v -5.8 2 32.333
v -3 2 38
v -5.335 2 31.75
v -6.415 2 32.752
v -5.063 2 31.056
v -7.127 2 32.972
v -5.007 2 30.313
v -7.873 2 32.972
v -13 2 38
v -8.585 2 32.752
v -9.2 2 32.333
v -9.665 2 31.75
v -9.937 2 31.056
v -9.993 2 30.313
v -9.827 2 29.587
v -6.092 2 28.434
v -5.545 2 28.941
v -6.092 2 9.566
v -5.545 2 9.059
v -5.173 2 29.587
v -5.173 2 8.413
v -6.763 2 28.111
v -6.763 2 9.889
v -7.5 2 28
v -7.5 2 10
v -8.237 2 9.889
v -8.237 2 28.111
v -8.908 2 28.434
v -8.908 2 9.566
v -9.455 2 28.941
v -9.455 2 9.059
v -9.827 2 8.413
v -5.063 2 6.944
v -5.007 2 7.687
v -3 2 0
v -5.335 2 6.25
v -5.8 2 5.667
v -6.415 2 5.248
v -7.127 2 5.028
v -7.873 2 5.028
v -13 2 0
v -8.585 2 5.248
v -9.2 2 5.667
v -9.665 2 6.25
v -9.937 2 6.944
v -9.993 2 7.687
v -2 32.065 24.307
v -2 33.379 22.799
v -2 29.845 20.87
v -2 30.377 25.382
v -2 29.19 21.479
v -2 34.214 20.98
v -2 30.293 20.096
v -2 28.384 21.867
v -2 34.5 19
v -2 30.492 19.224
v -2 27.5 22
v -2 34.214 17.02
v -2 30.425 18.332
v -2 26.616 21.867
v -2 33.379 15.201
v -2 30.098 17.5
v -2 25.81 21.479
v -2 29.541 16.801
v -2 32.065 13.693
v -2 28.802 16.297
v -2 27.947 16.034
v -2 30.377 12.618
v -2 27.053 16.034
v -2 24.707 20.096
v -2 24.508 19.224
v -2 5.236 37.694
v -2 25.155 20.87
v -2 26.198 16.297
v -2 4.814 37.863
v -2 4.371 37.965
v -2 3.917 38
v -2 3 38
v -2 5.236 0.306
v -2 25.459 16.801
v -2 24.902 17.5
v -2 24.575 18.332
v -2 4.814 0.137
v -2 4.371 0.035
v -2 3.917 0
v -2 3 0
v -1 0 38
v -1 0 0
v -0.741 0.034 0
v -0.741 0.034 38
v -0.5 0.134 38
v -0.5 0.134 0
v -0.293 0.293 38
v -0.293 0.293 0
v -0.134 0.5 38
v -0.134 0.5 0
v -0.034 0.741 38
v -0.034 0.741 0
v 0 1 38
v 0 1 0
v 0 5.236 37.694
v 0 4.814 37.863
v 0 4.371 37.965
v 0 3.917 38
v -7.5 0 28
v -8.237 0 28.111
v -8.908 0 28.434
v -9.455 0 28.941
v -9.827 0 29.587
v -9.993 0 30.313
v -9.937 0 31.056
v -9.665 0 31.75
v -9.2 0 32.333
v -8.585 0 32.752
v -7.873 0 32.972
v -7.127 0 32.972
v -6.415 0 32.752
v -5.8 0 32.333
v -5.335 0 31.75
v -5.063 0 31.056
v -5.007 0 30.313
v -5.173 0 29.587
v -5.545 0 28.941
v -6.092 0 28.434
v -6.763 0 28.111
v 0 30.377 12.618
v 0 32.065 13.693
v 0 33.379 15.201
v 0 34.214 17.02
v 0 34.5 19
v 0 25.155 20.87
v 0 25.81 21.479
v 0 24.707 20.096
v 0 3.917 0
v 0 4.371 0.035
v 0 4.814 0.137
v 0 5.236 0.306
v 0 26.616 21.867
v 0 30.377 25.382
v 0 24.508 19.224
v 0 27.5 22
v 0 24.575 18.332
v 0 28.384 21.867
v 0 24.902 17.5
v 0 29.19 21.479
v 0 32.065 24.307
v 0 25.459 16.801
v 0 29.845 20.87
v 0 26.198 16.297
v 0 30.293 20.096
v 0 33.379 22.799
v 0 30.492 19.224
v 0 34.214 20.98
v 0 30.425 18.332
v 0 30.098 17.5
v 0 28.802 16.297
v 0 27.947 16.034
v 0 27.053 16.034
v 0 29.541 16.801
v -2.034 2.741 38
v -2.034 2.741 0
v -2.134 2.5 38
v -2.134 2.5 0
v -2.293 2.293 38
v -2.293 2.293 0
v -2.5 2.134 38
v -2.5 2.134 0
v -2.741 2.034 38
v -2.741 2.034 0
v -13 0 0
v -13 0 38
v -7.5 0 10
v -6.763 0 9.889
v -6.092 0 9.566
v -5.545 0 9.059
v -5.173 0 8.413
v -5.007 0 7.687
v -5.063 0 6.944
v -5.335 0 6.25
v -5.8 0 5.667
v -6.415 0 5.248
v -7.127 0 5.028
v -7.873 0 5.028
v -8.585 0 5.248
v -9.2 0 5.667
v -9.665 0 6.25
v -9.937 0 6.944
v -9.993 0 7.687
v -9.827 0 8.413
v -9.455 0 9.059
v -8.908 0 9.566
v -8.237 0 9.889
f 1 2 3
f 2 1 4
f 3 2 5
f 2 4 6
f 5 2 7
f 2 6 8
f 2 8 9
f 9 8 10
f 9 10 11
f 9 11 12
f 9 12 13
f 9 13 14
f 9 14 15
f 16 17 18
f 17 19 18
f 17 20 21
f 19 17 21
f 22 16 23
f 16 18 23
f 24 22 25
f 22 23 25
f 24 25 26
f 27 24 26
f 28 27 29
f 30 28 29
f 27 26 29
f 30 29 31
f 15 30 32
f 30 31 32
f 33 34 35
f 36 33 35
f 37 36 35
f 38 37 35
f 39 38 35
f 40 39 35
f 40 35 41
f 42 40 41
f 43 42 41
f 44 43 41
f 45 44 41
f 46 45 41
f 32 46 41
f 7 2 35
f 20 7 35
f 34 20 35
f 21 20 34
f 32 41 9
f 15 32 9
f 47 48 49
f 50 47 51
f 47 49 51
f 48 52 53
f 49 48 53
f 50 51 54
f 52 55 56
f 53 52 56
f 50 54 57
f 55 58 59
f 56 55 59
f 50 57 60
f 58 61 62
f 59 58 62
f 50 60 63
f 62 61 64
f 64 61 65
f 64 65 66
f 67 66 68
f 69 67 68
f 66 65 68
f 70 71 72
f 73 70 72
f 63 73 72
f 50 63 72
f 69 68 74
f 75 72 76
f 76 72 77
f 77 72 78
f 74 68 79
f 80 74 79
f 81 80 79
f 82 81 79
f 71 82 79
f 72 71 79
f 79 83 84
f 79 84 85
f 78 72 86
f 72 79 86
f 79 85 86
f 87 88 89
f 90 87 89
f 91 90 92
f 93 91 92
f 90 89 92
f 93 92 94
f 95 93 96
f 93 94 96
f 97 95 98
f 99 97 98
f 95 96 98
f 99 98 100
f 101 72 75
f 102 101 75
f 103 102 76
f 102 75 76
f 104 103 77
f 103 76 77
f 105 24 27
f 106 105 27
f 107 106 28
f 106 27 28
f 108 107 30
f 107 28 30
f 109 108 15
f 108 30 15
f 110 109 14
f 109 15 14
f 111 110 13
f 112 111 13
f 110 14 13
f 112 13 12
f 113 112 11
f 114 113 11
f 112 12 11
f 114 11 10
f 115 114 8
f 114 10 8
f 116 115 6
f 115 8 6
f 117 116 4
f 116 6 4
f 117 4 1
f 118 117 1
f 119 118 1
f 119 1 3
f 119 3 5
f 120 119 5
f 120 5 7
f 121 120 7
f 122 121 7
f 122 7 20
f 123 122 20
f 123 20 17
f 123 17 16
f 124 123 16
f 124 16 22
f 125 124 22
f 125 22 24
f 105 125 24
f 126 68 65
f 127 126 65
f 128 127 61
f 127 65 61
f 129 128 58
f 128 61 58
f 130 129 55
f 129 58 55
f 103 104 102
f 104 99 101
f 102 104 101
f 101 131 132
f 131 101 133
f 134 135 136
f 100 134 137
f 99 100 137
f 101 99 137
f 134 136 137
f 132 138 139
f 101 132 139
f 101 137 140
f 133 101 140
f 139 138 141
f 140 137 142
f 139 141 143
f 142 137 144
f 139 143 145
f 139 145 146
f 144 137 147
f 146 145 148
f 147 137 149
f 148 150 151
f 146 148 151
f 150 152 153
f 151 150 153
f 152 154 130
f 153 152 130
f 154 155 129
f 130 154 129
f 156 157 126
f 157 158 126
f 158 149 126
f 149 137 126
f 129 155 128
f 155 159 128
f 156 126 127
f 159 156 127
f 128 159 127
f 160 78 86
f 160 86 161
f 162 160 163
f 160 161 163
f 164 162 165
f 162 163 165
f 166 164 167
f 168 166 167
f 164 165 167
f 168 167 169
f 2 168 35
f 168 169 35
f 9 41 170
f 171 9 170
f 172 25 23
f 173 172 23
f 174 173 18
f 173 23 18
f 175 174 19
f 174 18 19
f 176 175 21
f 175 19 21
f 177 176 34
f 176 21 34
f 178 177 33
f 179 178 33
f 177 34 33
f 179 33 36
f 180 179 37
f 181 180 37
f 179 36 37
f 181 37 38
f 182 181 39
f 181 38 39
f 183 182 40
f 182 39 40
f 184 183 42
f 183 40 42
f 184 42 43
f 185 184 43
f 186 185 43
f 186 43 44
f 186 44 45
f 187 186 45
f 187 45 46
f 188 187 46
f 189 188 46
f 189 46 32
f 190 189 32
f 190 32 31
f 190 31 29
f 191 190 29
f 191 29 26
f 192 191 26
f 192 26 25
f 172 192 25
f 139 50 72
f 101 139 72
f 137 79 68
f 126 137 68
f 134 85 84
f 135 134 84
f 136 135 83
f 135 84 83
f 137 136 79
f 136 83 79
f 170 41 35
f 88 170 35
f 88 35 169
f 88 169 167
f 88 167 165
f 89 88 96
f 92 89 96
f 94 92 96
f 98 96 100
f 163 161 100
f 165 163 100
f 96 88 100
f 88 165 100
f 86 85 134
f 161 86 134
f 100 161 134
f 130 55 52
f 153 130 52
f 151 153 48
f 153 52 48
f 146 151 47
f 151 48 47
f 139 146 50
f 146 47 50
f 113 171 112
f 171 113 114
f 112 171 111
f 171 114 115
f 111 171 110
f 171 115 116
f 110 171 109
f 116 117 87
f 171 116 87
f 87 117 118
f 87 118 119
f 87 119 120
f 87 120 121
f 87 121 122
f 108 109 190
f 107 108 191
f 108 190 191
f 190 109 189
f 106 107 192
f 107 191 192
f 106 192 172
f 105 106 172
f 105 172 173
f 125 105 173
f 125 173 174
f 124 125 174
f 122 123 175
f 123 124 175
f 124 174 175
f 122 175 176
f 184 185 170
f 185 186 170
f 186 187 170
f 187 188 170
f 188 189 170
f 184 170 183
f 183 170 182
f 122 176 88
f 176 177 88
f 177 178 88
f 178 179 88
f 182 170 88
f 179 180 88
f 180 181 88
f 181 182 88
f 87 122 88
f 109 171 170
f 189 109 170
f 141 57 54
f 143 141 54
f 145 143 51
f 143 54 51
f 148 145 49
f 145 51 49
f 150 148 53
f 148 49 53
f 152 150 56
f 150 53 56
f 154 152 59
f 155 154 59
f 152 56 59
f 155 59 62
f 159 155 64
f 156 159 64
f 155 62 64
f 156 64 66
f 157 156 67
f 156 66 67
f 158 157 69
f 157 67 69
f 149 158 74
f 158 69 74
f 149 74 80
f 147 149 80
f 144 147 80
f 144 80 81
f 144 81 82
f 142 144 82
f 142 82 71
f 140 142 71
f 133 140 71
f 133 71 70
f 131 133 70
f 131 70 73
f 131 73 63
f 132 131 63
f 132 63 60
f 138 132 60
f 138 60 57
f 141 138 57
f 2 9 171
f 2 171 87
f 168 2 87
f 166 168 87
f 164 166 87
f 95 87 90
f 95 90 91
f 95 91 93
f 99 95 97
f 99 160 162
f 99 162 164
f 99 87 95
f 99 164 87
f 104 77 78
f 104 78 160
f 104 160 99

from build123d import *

# Parameters (mm, degrees)
EXTRUDE_1_DEPTH     = 38
SKETCH_2_R          = 2.5
CUT_EXTRUDE_1_DEPTH = 52.664784912
SKETCH_3_R          = 3
CUT_EXTRUDE_2_DEPTH = 53.490475326
CUT_EXTRUDE_3_DEPTH = 53.490475326


with BuildPart() as part:
    # 草图1 → 凸台-拉伸1 (new body)
    with BuildSketch(Plane.XY):
        with BuildLine():
            Line((0, 1), (0, 34.5))
            Line((0, 34.5), (-2, 34.5))
            Line((-2, 34.5), (-2, 3))
            ThreePointArc((-2, 3), (-2.292893219, 2.292893219), (-3, 2))
            Line((-3, 2), (-13, 2))
            Line((-13, 2), (-13, 0))
            Line((-13, 0), (-1, 0))
            ThreePointArc((-1, 0), (-0.292893219, 0.292893219), (0, 1))
        make_face()
    extrude(amount=EXTRUDE_1_DEPTH)

    # 草图2 → 切除-拉伸1 (cut, through all)
    with BuildSketch(Plane(origin=(0, 2, 0), x_dir=(1, 0, 0), z_dir=(0, 1, 0))):
        with Locations(Location((-7.5, -7.5, 0), (0, 0, 270))):
            Circle(SKETCH_2_R)
        with Locations(Location((-7.5, -30.5, 0), (0, 0, 90))):
            Circle(SKETCH_2_R)
    extrude(amount=-CUT_EXTRUDE_1_DEPTH, mode=Mode.SUBTRACT)

    # 草图3 → 切除-拉伸2 (cut, through all)
    with BuildSketch(Plane.ZY.offset(2)):
        with Locations((19, 27.5)):
            Circle(SKETCH_3_R)
    extrude(amount=-CUT_EXTRUDE_2_DEPTH, mode=Mode.SUBTRACT)

    # 草图4 → 切除-拉伸3 (cut, through all)
    with BuildSketch(Plane.ZY.offset(2)):
        with BuildLine():
            Line((0, 34.5), (0, 3.916925189))
            ThreePointArc((0, 3.916925189), (0.077442494, 4.594167854), (0.305771751, 5.23644561))
            Line((0.305771751, 5.23644561), (12.618411108, 30.376686151))
            ThreePointArc((12.618411108, 30.376686151), (15.201105625, 33.379489904), (19, 34.5))
            Line((19, 34.5), (0, 34.5))
        make_face()
        with BuildLine():
            Line((38, 34.5), (19, 34.5))
            ThreePointArc((19, 34.5), (22.798894375, 33.379489904), (25.381588892, 30.376686151))
            Line((25.381588892, 30.376686151), (37.694228249, 5.23644561))
            ThreePointArc((37.694228249, 5.23644561), (37.922557506, 4.594167854), (38, 3.916925189))
            Line((38, 3.916925189), (38, 34.5))
        make_face()
    extrude(amount=-CUT_EXTRUDE_3_DEPTH, mode=Mode.SUBTRACT)


solid = part.part
